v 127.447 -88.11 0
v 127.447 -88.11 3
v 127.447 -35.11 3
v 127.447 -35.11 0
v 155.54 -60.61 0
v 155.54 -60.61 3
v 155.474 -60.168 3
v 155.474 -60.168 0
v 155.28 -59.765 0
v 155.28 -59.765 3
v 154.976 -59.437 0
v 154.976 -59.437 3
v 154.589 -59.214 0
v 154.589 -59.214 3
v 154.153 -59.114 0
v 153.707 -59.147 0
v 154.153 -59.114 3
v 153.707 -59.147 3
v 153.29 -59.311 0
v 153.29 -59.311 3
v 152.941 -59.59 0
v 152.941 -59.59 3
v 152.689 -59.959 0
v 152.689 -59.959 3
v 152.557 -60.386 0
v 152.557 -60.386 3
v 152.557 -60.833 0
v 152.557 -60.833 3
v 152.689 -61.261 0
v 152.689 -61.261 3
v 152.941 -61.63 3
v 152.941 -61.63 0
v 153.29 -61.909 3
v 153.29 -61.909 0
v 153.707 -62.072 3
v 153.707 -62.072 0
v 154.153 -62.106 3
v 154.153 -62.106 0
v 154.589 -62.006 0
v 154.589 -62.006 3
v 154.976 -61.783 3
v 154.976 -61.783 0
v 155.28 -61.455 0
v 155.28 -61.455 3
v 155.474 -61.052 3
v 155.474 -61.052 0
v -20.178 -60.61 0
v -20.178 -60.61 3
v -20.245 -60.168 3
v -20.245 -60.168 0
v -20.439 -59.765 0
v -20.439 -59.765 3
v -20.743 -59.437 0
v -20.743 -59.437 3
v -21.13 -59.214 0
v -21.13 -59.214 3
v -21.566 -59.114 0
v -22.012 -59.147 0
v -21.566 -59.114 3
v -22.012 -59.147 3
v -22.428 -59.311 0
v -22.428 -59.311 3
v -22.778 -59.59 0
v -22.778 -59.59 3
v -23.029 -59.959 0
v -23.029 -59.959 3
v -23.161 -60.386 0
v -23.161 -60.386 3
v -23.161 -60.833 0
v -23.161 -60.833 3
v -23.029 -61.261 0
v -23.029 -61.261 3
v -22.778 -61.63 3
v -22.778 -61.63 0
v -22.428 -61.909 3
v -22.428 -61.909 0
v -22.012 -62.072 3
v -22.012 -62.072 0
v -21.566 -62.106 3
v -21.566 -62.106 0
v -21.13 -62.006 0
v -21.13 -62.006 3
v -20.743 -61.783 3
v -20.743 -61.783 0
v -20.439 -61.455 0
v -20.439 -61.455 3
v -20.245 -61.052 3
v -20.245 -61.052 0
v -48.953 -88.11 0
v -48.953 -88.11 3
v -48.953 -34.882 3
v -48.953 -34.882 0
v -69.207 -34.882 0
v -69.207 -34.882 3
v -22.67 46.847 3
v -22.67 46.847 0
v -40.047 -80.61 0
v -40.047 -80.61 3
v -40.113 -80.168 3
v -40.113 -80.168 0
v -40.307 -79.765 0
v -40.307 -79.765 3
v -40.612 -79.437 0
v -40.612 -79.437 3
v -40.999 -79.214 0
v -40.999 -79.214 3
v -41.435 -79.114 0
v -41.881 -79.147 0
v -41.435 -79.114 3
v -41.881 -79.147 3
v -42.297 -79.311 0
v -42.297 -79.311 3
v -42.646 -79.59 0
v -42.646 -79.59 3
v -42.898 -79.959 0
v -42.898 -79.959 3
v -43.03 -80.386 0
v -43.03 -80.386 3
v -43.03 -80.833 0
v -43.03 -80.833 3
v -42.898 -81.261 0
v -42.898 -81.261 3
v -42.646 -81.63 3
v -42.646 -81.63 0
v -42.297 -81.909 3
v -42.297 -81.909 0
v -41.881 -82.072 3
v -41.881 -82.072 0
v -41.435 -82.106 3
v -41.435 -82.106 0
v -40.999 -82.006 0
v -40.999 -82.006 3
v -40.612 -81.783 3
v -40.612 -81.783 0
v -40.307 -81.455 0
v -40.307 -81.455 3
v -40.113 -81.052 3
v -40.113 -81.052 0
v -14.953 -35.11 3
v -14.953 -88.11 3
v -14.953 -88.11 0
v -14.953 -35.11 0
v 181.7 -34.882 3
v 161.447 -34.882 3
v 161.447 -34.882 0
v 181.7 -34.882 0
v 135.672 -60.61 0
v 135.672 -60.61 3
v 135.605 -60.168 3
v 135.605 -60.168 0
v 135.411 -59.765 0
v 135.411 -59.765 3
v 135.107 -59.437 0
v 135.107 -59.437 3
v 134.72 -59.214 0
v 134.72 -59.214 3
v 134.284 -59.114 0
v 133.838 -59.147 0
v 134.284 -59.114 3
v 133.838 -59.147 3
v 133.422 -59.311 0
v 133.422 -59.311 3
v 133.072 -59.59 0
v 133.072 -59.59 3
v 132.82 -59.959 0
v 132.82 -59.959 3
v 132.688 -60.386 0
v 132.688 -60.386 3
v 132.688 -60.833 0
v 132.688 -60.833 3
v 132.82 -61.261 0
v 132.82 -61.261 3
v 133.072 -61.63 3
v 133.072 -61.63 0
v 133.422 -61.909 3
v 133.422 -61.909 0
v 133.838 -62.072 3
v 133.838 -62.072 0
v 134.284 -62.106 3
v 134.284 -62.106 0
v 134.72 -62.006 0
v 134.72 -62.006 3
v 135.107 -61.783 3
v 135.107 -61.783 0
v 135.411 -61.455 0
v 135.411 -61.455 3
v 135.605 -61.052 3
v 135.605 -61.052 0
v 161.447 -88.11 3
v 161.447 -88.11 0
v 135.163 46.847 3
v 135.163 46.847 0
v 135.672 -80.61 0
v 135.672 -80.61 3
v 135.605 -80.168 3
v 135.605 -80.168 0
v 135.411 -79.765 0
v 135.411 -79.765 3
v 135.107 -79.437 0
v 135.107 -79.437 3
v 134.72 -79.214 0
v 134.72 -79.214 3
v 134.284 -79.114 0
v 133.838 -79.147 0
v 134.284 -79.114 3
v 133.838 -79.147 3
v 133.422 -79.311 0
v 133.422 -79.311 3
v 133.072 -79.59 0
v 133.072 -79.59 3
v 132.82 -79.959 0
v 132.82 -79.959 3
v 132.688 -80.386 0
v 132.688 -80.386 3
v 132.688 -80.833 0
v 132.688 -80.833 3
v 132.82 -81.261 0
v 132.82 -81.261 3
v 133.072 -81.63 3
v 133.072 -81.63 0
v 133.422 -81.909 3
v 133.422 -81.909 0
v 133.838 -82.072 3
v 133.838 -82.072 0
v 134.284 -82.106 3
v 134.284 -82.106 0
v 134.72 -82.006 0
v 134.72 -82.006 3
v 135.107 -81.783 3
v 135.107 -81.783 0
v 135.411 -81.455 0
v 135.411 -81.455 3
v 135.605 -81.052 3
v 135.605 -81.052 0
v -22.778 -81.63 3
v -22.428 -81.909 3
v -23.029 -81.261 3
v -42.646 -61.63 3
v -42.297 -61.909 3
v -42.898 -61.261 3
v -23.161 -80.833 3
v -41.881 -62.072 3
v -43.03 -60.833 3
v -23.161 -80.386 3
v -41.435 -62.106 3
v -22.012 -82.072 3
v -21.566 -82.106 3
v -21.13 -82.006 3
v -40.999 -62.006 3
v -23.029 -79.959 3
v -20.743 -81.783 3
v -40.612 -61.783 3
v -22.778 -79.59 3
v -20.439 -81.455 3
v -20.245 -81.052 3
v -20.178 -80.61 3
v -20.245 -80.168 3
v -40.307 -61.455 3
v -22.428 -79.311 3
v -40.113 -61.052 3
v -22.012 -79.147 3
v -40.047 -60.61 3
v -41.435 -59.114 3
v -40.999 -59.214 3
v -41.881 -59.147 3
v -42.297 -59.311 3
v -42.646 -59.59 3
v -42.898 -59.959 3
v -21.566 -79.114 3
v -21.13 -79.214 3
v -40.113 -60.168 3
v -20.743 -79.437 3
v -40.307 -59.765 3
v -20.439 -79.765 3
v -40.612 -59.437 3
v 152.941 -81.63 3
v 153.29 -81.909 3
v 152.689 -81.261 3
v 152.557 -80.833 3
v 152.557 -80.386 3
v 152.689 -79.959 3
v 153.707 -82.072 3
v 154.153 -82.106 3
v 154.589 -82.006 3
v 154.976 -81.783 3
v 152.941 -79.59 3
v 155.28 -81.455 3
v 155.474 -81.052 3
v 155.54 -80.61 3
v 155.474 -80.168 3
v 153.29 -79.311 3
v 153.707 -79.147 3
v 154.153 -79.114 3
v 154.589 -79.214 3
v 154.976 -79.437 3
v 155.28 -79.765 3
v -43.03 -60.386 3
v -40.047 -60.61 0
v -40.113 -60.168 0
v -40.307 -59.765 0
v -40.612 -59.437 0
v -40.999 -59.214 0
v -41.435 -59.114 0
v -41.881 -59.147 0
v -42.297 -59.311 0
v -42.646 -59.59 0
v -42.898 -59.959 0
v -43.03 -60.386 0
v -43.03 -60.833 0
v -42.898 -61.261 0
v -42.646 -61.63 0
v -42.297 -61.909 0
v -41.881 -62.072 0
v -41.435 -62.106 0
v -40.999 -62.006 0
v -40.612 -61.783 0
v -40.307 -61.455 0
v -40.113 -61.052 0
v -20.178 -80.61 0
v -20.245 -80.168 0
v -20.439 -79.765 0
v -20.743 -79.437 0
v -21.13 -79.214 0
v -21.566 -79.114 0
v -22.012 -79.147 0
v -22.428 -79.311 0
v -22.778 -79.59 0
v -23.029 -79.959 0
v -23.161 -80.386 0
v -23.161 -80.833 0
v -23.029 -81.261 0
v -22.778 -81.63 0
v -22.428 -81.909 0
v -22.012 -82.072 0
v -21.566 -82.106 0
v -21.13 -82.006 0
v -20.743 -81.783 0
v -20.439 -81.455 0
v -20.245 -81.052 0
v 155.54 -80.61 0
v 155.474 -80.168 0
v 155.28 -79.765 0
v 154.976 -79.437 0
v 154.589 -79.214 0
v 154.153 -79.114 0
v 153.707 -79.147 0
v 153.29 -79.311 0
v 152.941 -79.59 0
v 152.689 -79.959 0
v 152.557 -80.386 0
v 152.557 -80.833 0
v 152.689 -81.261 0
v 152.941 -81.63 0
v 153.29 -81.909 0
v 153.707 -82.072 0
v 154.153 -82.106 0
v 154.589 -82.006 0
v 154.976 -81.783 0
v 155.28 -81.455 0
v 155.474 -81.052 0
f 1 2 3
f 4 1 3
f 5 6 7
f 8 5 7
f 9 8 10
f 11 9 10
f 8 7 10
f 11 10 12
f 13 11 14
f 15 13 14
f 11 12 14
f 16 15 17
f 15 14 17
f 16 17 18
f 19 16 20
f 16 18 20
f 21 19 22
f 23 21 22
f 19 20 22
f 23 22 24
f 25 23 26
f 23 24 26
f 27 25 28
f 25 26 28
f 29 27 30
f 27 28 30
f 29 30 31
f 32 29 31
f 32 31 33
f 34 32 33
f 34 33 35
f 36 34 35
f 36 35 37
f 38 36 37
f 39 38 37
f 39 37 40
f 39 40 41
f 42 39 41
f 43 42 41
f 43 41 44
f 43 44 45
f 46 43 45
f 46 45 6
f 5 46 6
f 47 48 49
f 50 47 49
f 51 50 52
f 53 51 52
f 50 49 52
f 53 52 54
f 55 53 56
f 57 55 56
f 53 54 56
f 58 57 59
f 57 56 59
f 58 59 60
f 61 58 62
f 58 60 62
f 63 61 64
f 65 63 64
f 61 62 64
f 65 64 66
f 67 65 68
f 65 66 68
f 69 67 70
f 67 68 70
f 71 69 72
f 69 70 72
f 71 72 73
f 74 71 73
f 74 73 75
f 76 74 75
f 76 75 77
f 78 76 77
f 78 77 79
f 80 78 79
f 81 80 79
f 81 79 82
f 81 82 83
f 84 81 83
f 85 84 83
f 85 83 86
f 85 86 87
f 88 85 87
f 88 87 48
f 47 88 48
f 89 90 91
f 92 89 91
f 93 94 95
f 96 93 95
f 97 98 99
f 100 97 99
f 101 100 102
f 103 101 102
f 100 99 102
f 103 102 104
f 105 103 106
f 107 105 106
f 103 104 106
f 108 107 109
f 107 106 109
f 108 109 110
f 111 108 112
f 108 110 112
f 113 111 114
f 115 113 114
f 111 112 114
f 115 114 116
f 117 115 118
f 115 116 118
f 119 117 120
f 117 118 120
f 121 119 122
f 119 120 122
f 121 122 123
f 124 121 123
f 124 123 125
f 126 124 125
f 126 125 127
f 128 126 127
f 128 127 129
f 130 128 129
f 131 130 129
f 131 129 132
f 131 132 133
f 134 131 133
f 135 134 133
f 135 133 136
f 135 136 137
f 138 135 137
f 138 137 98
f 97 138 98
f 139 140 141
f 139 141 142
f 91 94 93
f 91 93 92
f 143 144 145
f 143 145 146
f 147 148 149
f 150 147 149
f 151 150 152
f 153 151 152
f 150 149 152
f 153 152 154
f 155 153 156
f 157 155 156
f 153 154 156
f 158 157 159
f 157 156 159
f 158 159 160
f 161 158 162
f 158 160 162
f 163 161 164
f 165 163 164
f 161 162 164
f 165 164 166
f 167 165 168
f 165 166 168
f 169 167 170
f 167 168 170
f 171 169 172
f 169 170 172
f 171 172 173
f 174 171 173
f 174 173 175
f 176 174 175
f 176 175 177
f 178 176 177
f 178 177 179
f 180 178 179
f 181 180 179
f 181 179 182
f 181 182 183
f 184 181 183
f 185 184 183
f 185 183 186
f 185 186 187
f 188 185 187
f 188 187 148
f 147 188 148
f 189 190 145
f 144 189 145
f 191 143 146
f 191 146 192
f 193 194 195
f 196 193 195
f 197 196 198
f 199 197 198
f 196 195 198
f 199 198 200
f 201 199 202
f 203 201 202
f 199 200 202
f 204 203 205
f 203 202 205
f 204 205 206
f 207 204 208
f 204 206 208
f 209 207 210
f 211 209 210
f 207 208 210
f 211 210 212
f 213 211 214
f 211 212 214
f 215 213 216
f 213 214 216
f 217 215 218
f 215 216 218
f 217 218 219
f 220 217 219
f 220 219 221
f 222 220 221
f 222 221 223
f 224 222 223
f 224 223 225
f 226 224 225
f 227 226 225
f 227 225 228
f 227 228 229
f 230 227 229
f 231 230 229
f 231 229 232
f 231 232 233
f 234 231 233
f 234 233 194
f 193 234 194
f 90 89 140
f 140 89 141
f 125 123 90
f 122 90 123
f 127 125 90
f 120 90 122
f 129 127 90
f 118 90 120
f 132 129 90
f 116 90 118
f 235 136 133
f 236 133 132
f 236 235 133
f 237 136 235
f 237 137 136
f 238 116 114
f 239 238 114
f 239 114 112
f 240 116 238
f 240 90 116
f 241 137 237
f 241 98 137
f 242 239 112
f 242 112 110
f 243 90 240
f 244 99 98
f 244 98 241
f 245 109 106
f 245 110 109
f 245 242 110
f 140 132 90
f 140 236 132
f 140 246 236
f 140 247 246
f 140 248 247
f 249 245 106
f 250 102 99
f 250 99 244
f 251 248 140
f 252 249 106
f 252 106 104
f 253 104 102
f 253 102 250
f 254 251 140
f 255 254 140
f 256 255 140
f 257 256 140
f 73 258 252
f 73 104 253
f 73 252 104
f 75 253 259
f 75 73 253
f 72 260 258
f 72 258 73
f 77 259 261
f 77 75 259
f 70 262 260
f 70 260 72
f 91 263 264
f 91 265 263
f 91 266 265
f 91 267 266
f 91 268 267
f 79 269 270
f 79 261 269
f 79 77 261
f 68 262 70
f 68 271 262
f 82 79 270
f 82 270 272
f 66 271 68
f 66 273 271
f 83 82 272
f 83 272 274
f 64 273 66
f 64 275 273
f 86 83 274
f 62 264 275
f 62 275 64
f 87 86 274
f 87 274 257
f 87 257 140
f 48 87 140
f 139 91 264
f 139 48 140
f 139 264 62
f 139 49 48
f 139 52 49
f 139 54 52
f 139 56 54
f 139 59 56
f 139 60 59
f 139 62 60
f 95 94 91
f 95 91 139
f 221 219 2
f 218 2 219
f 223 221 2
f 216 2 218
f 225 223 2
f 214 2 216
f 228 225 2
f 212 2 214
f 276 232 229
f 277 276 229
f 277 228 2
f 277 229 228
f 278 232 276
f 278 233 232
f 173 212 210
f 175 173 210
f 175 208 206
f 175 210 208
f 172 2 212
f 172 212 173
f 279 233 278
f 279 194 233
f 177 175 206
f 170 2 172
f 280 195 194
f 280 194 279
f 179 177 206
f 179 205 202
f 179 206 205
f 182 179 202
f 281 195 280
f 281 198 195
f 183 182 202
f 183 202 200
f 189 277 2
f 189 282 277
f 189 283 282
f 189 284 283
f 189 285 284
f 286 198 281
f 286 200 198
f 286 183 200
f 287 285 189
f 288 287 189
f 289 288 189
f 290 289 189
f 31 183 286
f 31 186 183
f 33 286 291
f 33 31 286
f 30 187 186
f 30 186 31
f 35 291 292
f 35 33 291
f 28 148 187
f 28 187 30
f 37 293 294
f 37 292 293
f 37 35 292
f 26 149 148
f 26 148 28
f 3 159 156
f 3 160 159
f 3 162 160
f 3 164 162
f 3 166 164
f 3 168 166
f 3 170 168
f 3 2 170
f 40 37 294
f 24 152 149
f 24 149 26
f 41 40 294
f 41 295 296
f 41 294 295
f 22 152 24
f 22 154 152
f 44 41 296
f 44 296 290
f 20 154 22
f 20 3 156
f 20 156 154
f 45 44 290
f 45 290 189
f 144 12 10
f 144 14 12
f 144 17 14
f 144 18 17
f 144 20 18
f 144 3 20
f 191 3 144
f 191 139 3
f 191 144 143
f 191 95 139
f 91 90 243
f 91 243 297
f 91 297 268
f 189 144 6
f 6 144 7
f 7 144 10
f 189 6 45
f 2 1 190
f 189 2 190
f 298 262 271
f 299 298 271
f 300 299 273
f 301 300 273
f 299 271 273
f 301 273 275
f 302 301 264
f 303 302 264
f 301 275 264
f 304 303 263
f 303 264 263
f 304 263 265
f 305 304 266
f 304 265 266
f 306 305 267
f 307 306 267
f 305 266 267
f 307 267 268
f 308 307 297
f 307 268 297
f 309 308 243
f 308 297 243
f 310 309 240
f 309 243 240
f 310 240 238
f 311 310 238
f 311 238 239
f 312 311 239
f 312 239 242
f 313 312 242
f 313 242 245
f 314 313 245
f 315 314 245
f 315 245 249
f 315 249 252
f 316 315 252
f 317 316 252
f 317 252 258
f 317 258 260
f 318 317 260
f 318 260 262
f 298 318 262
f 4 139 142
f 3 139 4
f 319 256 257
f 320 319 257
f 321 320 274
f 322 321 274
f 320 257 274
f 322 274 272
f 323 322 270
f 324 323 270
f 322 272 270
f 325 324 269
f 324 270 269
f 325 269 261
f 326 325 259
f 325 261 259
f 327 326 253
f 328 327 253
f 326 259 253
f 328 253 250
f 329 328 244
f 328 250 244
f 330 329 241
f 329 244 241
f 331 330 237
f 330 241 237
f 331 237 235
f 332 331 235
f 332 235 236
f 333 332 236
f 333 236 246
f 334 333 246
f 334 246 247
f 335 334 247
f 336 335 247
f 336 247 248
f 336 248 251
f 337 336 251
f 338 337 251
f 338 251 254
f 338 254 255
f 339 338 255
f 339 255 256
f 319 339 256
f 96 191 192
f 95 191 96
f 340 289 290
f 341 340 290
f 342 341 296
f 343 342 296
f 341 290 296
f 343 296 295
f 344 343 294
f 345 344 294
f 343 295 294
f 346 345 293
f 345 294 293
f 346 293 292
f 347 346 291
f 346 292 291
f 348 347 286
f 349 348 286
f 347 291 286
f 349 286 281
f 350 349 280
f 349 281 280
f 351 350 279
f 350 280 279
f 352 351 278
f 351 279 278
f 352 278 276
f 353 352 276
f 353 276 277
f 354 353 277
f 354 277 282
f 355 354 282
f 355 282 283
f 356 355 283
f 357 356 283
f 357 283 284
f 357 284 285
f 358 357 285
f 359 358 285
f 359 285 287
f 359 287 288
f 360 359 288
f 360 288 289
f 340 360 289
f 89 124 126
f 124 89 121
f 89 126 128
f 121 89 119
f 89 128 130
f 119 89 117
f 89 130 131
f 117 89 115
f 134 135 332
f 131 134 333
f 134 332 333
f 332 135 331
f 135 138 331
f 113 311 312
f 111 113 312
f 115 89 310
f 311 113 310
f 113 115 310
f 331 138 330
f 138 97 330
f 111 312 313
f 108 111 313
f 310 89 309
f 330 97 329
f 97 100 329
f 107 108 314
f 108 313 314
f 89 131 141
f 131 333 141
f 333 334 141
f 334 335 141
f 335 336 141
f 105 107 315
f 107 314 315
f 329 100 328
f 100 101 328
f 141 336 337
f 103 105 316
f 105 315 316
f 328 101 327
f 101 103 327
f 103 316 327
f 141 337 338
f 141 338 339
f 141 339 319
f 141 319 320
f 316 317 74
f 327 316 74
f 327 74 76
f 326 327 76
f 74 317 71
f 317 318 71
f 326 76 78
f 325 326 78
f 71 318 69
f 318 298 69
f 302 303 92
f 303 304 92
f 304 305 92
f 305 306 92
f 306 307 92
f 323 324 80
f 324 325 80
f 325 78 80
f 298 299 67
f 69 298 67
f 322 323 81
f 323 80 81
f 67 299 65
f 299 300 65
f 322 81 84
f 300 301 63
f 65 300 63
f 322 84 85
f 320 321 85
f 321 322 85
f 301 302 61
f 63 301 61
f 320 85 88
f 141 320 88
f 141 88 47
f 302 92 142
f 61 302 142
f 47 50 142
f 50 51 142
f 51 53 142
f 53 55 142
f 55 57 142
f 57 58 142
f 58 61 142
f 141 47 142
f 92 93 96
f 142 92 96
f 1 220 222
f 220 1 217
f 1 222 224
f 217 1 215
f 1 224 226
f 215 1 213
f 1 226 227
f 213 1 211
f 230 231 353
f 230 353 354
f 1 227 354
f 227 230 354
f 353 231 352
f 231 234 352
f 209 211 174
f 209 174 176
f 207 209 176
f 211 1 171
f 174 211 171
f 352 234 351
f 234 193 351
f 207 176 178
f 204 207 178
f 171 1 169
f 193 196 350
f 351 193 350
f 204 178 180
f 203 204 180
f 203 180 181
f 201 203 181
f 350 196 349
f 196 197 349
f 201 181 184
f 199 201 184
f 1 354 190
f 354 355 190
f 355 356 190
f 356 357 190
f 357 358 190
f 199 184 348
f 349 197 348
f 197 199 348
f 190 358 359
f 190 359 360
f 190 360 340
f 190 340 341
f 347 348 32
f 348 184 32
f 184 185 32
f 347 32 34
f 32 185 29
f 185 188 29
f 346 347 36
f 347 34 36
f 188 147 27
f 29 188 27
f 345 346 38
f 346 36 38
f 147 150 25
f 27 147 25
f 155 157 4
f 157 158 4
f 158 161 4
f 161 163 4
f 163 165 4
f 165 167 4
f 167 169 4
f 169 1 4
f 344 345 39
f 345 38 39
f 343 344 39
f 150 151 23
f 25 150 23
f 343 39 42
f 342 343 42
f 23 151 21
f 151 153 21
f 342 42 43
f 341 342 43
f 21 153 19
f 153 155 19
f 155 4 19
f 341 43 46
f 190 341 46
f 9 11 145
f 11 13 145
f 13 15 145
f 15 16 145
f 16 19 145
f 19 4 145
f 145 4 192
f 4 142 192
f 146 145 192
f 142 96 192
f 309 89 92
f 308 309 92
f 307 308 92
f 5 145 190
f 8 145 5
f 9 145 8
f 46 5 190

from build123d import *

# Parameters (mm, degrees)
SKETCH_1_W          = 322.893717544
SKETCH_1_H          = 176.219773954
EXTRUDE_1_DEPTH     = 3
SKETCH_2_W          = 142.4
SKETCH_2_H          = 35
SKETCH_2_W_2        = 112.493717544
SKETCH_2_H_2        = 176.219773954
CUT_EXTRUDE_1_DEPTH = 3
SKETCH_4_W          = 142.4
SKETCH_4_H          = 18
CUT_EXTRUDE_2_DEPTH = 184.949559365
SKETCH_14_R         = 1.5
CUT_EXTRUDE_4_DEPTH = 184.949559365
EXTRUDE_3_DEPTH     = 3
CUT_EXTRUDE_5_DEPTH = 202.958956474
CUT_EXTRUDE_6_DEPTH = 202.958956474


with BuildPart() as part:
    # 草图1 → 凸台-拉伸1 (new body)
    with BuildSketch(Plane.XY):
        Rectangle(SKETCH_1_W, SKETCH_1_H)
    extrude(amount=EXTRUDE_1_DEPTH)

    # 草图2 → 切除-拉伸1 (cut)
    with BuildSketch(Plane.XY.offset(3)):
        with Locations((56.246858772, -70.609886977)):
            Rectangle(SKETCH_2_W, SKETCH_2_H)
        with Locations((-105.2, 0)):
            Rectangle(SKETCH_2_W_2, SKETCH_2_H_2)
    extrude(amount=-CUT_EXTRUDE_1_DEPTH, mode=Mode.SUBTRACT)

    # 草图4 → 切除-拉伸2 (cut, through all)
    with BuildSketch(Plane.XY.offset(3)):
        with Locations((56.246858772, -44.109886977)):
            Rectangle(SKETCH_4_W, SKETCH_4_H)
    extrude(amount=-CUT_EXTRUDE_2_DEPTH, mode=Mode.SUBTRACT)

    # 草图14 → 切除-拉伸4 (cut, through all)
    with BuildSketch(Plane.XY.offset(3)):
        with Locations((154.040490147, -60.609886977)):
            Circle(SKETCH_14_R)
        with Locations((154.040490147, -80.609886977)):
            Circle(SKETCH_14_R)
        with Locations((134.171700532, -60.609886977)):
            Circle(SKETCH_14_R)
        with Locations((134.171700532, -80.609886977)):
            Circle(SKETCH_14_R)
        with Locations((-21.677982988, -60.609886977)):
            Circle(SKETCH_14_R)
        with Locations((-21.677982988, -80.609886977)):
            Circle(SKETCH_14_R)
        with Locations((-41.546772603, -60.609886977)):
            Circle(SKETCH_14_R)
        with Locations((-41.546772603, -80.609886977)):
            Circle(SKETCH_14_R)
    extrude(amount=-CUT_EXTRUDE_4_DEPTH, mode=Mode.SUBTRACT)

    # 草图19 → 凸台-拉伸3 (add)
    with BuildSketch(Plane.XY.offset(3)):
        Polygon((-48.953141228, -34.8815165), (-48.953141228, 3.544050126), (-69.206772046, -34.8815165), align=None)
        Polygon((161.446858772, 3.544050126), (161.446858772, -34.8815165), (181.70048959, -34.8815165), align=None)
    extrude(amount=-EXTRUDE_3_DEPTH)

    # 草图20 → 切除-拉伸5 (cut, through all)
    with BuildSketch(Plane.XY.offset(3)):
        Polygon((-48.953141228, 3.544050126), (-48.953141228, 88.109886977), (161.446858772, 88.109886977), (161.446858772, 3.544050126), (138.622177289, 46.847462087), (-26.128459745, 46.847462087), align=None)
    extrude(amount=-CUT_EXTRUDE_5_DEPTH, mode=Mode.SUBTRACT)

    # 草图21 → 切除-拉伸6 (cut, through all)
    with BuildSketch(Plane.XY.offset(3)):
        Polygon((-69.206772046, -34.8815165), (-22.62920761, 46.919811864), (-26.128459745, 46.847462087), align=None)
        Polygon((181.70048959, -34.8815165), (135.122177289, 46.919811864), (138.622177289, 46.847462087), align=None)
    extrude(amount=-CUT_EXTRUDE_6_DEPTH, mode=Mode.SUBTRACT)


solid = part.part
